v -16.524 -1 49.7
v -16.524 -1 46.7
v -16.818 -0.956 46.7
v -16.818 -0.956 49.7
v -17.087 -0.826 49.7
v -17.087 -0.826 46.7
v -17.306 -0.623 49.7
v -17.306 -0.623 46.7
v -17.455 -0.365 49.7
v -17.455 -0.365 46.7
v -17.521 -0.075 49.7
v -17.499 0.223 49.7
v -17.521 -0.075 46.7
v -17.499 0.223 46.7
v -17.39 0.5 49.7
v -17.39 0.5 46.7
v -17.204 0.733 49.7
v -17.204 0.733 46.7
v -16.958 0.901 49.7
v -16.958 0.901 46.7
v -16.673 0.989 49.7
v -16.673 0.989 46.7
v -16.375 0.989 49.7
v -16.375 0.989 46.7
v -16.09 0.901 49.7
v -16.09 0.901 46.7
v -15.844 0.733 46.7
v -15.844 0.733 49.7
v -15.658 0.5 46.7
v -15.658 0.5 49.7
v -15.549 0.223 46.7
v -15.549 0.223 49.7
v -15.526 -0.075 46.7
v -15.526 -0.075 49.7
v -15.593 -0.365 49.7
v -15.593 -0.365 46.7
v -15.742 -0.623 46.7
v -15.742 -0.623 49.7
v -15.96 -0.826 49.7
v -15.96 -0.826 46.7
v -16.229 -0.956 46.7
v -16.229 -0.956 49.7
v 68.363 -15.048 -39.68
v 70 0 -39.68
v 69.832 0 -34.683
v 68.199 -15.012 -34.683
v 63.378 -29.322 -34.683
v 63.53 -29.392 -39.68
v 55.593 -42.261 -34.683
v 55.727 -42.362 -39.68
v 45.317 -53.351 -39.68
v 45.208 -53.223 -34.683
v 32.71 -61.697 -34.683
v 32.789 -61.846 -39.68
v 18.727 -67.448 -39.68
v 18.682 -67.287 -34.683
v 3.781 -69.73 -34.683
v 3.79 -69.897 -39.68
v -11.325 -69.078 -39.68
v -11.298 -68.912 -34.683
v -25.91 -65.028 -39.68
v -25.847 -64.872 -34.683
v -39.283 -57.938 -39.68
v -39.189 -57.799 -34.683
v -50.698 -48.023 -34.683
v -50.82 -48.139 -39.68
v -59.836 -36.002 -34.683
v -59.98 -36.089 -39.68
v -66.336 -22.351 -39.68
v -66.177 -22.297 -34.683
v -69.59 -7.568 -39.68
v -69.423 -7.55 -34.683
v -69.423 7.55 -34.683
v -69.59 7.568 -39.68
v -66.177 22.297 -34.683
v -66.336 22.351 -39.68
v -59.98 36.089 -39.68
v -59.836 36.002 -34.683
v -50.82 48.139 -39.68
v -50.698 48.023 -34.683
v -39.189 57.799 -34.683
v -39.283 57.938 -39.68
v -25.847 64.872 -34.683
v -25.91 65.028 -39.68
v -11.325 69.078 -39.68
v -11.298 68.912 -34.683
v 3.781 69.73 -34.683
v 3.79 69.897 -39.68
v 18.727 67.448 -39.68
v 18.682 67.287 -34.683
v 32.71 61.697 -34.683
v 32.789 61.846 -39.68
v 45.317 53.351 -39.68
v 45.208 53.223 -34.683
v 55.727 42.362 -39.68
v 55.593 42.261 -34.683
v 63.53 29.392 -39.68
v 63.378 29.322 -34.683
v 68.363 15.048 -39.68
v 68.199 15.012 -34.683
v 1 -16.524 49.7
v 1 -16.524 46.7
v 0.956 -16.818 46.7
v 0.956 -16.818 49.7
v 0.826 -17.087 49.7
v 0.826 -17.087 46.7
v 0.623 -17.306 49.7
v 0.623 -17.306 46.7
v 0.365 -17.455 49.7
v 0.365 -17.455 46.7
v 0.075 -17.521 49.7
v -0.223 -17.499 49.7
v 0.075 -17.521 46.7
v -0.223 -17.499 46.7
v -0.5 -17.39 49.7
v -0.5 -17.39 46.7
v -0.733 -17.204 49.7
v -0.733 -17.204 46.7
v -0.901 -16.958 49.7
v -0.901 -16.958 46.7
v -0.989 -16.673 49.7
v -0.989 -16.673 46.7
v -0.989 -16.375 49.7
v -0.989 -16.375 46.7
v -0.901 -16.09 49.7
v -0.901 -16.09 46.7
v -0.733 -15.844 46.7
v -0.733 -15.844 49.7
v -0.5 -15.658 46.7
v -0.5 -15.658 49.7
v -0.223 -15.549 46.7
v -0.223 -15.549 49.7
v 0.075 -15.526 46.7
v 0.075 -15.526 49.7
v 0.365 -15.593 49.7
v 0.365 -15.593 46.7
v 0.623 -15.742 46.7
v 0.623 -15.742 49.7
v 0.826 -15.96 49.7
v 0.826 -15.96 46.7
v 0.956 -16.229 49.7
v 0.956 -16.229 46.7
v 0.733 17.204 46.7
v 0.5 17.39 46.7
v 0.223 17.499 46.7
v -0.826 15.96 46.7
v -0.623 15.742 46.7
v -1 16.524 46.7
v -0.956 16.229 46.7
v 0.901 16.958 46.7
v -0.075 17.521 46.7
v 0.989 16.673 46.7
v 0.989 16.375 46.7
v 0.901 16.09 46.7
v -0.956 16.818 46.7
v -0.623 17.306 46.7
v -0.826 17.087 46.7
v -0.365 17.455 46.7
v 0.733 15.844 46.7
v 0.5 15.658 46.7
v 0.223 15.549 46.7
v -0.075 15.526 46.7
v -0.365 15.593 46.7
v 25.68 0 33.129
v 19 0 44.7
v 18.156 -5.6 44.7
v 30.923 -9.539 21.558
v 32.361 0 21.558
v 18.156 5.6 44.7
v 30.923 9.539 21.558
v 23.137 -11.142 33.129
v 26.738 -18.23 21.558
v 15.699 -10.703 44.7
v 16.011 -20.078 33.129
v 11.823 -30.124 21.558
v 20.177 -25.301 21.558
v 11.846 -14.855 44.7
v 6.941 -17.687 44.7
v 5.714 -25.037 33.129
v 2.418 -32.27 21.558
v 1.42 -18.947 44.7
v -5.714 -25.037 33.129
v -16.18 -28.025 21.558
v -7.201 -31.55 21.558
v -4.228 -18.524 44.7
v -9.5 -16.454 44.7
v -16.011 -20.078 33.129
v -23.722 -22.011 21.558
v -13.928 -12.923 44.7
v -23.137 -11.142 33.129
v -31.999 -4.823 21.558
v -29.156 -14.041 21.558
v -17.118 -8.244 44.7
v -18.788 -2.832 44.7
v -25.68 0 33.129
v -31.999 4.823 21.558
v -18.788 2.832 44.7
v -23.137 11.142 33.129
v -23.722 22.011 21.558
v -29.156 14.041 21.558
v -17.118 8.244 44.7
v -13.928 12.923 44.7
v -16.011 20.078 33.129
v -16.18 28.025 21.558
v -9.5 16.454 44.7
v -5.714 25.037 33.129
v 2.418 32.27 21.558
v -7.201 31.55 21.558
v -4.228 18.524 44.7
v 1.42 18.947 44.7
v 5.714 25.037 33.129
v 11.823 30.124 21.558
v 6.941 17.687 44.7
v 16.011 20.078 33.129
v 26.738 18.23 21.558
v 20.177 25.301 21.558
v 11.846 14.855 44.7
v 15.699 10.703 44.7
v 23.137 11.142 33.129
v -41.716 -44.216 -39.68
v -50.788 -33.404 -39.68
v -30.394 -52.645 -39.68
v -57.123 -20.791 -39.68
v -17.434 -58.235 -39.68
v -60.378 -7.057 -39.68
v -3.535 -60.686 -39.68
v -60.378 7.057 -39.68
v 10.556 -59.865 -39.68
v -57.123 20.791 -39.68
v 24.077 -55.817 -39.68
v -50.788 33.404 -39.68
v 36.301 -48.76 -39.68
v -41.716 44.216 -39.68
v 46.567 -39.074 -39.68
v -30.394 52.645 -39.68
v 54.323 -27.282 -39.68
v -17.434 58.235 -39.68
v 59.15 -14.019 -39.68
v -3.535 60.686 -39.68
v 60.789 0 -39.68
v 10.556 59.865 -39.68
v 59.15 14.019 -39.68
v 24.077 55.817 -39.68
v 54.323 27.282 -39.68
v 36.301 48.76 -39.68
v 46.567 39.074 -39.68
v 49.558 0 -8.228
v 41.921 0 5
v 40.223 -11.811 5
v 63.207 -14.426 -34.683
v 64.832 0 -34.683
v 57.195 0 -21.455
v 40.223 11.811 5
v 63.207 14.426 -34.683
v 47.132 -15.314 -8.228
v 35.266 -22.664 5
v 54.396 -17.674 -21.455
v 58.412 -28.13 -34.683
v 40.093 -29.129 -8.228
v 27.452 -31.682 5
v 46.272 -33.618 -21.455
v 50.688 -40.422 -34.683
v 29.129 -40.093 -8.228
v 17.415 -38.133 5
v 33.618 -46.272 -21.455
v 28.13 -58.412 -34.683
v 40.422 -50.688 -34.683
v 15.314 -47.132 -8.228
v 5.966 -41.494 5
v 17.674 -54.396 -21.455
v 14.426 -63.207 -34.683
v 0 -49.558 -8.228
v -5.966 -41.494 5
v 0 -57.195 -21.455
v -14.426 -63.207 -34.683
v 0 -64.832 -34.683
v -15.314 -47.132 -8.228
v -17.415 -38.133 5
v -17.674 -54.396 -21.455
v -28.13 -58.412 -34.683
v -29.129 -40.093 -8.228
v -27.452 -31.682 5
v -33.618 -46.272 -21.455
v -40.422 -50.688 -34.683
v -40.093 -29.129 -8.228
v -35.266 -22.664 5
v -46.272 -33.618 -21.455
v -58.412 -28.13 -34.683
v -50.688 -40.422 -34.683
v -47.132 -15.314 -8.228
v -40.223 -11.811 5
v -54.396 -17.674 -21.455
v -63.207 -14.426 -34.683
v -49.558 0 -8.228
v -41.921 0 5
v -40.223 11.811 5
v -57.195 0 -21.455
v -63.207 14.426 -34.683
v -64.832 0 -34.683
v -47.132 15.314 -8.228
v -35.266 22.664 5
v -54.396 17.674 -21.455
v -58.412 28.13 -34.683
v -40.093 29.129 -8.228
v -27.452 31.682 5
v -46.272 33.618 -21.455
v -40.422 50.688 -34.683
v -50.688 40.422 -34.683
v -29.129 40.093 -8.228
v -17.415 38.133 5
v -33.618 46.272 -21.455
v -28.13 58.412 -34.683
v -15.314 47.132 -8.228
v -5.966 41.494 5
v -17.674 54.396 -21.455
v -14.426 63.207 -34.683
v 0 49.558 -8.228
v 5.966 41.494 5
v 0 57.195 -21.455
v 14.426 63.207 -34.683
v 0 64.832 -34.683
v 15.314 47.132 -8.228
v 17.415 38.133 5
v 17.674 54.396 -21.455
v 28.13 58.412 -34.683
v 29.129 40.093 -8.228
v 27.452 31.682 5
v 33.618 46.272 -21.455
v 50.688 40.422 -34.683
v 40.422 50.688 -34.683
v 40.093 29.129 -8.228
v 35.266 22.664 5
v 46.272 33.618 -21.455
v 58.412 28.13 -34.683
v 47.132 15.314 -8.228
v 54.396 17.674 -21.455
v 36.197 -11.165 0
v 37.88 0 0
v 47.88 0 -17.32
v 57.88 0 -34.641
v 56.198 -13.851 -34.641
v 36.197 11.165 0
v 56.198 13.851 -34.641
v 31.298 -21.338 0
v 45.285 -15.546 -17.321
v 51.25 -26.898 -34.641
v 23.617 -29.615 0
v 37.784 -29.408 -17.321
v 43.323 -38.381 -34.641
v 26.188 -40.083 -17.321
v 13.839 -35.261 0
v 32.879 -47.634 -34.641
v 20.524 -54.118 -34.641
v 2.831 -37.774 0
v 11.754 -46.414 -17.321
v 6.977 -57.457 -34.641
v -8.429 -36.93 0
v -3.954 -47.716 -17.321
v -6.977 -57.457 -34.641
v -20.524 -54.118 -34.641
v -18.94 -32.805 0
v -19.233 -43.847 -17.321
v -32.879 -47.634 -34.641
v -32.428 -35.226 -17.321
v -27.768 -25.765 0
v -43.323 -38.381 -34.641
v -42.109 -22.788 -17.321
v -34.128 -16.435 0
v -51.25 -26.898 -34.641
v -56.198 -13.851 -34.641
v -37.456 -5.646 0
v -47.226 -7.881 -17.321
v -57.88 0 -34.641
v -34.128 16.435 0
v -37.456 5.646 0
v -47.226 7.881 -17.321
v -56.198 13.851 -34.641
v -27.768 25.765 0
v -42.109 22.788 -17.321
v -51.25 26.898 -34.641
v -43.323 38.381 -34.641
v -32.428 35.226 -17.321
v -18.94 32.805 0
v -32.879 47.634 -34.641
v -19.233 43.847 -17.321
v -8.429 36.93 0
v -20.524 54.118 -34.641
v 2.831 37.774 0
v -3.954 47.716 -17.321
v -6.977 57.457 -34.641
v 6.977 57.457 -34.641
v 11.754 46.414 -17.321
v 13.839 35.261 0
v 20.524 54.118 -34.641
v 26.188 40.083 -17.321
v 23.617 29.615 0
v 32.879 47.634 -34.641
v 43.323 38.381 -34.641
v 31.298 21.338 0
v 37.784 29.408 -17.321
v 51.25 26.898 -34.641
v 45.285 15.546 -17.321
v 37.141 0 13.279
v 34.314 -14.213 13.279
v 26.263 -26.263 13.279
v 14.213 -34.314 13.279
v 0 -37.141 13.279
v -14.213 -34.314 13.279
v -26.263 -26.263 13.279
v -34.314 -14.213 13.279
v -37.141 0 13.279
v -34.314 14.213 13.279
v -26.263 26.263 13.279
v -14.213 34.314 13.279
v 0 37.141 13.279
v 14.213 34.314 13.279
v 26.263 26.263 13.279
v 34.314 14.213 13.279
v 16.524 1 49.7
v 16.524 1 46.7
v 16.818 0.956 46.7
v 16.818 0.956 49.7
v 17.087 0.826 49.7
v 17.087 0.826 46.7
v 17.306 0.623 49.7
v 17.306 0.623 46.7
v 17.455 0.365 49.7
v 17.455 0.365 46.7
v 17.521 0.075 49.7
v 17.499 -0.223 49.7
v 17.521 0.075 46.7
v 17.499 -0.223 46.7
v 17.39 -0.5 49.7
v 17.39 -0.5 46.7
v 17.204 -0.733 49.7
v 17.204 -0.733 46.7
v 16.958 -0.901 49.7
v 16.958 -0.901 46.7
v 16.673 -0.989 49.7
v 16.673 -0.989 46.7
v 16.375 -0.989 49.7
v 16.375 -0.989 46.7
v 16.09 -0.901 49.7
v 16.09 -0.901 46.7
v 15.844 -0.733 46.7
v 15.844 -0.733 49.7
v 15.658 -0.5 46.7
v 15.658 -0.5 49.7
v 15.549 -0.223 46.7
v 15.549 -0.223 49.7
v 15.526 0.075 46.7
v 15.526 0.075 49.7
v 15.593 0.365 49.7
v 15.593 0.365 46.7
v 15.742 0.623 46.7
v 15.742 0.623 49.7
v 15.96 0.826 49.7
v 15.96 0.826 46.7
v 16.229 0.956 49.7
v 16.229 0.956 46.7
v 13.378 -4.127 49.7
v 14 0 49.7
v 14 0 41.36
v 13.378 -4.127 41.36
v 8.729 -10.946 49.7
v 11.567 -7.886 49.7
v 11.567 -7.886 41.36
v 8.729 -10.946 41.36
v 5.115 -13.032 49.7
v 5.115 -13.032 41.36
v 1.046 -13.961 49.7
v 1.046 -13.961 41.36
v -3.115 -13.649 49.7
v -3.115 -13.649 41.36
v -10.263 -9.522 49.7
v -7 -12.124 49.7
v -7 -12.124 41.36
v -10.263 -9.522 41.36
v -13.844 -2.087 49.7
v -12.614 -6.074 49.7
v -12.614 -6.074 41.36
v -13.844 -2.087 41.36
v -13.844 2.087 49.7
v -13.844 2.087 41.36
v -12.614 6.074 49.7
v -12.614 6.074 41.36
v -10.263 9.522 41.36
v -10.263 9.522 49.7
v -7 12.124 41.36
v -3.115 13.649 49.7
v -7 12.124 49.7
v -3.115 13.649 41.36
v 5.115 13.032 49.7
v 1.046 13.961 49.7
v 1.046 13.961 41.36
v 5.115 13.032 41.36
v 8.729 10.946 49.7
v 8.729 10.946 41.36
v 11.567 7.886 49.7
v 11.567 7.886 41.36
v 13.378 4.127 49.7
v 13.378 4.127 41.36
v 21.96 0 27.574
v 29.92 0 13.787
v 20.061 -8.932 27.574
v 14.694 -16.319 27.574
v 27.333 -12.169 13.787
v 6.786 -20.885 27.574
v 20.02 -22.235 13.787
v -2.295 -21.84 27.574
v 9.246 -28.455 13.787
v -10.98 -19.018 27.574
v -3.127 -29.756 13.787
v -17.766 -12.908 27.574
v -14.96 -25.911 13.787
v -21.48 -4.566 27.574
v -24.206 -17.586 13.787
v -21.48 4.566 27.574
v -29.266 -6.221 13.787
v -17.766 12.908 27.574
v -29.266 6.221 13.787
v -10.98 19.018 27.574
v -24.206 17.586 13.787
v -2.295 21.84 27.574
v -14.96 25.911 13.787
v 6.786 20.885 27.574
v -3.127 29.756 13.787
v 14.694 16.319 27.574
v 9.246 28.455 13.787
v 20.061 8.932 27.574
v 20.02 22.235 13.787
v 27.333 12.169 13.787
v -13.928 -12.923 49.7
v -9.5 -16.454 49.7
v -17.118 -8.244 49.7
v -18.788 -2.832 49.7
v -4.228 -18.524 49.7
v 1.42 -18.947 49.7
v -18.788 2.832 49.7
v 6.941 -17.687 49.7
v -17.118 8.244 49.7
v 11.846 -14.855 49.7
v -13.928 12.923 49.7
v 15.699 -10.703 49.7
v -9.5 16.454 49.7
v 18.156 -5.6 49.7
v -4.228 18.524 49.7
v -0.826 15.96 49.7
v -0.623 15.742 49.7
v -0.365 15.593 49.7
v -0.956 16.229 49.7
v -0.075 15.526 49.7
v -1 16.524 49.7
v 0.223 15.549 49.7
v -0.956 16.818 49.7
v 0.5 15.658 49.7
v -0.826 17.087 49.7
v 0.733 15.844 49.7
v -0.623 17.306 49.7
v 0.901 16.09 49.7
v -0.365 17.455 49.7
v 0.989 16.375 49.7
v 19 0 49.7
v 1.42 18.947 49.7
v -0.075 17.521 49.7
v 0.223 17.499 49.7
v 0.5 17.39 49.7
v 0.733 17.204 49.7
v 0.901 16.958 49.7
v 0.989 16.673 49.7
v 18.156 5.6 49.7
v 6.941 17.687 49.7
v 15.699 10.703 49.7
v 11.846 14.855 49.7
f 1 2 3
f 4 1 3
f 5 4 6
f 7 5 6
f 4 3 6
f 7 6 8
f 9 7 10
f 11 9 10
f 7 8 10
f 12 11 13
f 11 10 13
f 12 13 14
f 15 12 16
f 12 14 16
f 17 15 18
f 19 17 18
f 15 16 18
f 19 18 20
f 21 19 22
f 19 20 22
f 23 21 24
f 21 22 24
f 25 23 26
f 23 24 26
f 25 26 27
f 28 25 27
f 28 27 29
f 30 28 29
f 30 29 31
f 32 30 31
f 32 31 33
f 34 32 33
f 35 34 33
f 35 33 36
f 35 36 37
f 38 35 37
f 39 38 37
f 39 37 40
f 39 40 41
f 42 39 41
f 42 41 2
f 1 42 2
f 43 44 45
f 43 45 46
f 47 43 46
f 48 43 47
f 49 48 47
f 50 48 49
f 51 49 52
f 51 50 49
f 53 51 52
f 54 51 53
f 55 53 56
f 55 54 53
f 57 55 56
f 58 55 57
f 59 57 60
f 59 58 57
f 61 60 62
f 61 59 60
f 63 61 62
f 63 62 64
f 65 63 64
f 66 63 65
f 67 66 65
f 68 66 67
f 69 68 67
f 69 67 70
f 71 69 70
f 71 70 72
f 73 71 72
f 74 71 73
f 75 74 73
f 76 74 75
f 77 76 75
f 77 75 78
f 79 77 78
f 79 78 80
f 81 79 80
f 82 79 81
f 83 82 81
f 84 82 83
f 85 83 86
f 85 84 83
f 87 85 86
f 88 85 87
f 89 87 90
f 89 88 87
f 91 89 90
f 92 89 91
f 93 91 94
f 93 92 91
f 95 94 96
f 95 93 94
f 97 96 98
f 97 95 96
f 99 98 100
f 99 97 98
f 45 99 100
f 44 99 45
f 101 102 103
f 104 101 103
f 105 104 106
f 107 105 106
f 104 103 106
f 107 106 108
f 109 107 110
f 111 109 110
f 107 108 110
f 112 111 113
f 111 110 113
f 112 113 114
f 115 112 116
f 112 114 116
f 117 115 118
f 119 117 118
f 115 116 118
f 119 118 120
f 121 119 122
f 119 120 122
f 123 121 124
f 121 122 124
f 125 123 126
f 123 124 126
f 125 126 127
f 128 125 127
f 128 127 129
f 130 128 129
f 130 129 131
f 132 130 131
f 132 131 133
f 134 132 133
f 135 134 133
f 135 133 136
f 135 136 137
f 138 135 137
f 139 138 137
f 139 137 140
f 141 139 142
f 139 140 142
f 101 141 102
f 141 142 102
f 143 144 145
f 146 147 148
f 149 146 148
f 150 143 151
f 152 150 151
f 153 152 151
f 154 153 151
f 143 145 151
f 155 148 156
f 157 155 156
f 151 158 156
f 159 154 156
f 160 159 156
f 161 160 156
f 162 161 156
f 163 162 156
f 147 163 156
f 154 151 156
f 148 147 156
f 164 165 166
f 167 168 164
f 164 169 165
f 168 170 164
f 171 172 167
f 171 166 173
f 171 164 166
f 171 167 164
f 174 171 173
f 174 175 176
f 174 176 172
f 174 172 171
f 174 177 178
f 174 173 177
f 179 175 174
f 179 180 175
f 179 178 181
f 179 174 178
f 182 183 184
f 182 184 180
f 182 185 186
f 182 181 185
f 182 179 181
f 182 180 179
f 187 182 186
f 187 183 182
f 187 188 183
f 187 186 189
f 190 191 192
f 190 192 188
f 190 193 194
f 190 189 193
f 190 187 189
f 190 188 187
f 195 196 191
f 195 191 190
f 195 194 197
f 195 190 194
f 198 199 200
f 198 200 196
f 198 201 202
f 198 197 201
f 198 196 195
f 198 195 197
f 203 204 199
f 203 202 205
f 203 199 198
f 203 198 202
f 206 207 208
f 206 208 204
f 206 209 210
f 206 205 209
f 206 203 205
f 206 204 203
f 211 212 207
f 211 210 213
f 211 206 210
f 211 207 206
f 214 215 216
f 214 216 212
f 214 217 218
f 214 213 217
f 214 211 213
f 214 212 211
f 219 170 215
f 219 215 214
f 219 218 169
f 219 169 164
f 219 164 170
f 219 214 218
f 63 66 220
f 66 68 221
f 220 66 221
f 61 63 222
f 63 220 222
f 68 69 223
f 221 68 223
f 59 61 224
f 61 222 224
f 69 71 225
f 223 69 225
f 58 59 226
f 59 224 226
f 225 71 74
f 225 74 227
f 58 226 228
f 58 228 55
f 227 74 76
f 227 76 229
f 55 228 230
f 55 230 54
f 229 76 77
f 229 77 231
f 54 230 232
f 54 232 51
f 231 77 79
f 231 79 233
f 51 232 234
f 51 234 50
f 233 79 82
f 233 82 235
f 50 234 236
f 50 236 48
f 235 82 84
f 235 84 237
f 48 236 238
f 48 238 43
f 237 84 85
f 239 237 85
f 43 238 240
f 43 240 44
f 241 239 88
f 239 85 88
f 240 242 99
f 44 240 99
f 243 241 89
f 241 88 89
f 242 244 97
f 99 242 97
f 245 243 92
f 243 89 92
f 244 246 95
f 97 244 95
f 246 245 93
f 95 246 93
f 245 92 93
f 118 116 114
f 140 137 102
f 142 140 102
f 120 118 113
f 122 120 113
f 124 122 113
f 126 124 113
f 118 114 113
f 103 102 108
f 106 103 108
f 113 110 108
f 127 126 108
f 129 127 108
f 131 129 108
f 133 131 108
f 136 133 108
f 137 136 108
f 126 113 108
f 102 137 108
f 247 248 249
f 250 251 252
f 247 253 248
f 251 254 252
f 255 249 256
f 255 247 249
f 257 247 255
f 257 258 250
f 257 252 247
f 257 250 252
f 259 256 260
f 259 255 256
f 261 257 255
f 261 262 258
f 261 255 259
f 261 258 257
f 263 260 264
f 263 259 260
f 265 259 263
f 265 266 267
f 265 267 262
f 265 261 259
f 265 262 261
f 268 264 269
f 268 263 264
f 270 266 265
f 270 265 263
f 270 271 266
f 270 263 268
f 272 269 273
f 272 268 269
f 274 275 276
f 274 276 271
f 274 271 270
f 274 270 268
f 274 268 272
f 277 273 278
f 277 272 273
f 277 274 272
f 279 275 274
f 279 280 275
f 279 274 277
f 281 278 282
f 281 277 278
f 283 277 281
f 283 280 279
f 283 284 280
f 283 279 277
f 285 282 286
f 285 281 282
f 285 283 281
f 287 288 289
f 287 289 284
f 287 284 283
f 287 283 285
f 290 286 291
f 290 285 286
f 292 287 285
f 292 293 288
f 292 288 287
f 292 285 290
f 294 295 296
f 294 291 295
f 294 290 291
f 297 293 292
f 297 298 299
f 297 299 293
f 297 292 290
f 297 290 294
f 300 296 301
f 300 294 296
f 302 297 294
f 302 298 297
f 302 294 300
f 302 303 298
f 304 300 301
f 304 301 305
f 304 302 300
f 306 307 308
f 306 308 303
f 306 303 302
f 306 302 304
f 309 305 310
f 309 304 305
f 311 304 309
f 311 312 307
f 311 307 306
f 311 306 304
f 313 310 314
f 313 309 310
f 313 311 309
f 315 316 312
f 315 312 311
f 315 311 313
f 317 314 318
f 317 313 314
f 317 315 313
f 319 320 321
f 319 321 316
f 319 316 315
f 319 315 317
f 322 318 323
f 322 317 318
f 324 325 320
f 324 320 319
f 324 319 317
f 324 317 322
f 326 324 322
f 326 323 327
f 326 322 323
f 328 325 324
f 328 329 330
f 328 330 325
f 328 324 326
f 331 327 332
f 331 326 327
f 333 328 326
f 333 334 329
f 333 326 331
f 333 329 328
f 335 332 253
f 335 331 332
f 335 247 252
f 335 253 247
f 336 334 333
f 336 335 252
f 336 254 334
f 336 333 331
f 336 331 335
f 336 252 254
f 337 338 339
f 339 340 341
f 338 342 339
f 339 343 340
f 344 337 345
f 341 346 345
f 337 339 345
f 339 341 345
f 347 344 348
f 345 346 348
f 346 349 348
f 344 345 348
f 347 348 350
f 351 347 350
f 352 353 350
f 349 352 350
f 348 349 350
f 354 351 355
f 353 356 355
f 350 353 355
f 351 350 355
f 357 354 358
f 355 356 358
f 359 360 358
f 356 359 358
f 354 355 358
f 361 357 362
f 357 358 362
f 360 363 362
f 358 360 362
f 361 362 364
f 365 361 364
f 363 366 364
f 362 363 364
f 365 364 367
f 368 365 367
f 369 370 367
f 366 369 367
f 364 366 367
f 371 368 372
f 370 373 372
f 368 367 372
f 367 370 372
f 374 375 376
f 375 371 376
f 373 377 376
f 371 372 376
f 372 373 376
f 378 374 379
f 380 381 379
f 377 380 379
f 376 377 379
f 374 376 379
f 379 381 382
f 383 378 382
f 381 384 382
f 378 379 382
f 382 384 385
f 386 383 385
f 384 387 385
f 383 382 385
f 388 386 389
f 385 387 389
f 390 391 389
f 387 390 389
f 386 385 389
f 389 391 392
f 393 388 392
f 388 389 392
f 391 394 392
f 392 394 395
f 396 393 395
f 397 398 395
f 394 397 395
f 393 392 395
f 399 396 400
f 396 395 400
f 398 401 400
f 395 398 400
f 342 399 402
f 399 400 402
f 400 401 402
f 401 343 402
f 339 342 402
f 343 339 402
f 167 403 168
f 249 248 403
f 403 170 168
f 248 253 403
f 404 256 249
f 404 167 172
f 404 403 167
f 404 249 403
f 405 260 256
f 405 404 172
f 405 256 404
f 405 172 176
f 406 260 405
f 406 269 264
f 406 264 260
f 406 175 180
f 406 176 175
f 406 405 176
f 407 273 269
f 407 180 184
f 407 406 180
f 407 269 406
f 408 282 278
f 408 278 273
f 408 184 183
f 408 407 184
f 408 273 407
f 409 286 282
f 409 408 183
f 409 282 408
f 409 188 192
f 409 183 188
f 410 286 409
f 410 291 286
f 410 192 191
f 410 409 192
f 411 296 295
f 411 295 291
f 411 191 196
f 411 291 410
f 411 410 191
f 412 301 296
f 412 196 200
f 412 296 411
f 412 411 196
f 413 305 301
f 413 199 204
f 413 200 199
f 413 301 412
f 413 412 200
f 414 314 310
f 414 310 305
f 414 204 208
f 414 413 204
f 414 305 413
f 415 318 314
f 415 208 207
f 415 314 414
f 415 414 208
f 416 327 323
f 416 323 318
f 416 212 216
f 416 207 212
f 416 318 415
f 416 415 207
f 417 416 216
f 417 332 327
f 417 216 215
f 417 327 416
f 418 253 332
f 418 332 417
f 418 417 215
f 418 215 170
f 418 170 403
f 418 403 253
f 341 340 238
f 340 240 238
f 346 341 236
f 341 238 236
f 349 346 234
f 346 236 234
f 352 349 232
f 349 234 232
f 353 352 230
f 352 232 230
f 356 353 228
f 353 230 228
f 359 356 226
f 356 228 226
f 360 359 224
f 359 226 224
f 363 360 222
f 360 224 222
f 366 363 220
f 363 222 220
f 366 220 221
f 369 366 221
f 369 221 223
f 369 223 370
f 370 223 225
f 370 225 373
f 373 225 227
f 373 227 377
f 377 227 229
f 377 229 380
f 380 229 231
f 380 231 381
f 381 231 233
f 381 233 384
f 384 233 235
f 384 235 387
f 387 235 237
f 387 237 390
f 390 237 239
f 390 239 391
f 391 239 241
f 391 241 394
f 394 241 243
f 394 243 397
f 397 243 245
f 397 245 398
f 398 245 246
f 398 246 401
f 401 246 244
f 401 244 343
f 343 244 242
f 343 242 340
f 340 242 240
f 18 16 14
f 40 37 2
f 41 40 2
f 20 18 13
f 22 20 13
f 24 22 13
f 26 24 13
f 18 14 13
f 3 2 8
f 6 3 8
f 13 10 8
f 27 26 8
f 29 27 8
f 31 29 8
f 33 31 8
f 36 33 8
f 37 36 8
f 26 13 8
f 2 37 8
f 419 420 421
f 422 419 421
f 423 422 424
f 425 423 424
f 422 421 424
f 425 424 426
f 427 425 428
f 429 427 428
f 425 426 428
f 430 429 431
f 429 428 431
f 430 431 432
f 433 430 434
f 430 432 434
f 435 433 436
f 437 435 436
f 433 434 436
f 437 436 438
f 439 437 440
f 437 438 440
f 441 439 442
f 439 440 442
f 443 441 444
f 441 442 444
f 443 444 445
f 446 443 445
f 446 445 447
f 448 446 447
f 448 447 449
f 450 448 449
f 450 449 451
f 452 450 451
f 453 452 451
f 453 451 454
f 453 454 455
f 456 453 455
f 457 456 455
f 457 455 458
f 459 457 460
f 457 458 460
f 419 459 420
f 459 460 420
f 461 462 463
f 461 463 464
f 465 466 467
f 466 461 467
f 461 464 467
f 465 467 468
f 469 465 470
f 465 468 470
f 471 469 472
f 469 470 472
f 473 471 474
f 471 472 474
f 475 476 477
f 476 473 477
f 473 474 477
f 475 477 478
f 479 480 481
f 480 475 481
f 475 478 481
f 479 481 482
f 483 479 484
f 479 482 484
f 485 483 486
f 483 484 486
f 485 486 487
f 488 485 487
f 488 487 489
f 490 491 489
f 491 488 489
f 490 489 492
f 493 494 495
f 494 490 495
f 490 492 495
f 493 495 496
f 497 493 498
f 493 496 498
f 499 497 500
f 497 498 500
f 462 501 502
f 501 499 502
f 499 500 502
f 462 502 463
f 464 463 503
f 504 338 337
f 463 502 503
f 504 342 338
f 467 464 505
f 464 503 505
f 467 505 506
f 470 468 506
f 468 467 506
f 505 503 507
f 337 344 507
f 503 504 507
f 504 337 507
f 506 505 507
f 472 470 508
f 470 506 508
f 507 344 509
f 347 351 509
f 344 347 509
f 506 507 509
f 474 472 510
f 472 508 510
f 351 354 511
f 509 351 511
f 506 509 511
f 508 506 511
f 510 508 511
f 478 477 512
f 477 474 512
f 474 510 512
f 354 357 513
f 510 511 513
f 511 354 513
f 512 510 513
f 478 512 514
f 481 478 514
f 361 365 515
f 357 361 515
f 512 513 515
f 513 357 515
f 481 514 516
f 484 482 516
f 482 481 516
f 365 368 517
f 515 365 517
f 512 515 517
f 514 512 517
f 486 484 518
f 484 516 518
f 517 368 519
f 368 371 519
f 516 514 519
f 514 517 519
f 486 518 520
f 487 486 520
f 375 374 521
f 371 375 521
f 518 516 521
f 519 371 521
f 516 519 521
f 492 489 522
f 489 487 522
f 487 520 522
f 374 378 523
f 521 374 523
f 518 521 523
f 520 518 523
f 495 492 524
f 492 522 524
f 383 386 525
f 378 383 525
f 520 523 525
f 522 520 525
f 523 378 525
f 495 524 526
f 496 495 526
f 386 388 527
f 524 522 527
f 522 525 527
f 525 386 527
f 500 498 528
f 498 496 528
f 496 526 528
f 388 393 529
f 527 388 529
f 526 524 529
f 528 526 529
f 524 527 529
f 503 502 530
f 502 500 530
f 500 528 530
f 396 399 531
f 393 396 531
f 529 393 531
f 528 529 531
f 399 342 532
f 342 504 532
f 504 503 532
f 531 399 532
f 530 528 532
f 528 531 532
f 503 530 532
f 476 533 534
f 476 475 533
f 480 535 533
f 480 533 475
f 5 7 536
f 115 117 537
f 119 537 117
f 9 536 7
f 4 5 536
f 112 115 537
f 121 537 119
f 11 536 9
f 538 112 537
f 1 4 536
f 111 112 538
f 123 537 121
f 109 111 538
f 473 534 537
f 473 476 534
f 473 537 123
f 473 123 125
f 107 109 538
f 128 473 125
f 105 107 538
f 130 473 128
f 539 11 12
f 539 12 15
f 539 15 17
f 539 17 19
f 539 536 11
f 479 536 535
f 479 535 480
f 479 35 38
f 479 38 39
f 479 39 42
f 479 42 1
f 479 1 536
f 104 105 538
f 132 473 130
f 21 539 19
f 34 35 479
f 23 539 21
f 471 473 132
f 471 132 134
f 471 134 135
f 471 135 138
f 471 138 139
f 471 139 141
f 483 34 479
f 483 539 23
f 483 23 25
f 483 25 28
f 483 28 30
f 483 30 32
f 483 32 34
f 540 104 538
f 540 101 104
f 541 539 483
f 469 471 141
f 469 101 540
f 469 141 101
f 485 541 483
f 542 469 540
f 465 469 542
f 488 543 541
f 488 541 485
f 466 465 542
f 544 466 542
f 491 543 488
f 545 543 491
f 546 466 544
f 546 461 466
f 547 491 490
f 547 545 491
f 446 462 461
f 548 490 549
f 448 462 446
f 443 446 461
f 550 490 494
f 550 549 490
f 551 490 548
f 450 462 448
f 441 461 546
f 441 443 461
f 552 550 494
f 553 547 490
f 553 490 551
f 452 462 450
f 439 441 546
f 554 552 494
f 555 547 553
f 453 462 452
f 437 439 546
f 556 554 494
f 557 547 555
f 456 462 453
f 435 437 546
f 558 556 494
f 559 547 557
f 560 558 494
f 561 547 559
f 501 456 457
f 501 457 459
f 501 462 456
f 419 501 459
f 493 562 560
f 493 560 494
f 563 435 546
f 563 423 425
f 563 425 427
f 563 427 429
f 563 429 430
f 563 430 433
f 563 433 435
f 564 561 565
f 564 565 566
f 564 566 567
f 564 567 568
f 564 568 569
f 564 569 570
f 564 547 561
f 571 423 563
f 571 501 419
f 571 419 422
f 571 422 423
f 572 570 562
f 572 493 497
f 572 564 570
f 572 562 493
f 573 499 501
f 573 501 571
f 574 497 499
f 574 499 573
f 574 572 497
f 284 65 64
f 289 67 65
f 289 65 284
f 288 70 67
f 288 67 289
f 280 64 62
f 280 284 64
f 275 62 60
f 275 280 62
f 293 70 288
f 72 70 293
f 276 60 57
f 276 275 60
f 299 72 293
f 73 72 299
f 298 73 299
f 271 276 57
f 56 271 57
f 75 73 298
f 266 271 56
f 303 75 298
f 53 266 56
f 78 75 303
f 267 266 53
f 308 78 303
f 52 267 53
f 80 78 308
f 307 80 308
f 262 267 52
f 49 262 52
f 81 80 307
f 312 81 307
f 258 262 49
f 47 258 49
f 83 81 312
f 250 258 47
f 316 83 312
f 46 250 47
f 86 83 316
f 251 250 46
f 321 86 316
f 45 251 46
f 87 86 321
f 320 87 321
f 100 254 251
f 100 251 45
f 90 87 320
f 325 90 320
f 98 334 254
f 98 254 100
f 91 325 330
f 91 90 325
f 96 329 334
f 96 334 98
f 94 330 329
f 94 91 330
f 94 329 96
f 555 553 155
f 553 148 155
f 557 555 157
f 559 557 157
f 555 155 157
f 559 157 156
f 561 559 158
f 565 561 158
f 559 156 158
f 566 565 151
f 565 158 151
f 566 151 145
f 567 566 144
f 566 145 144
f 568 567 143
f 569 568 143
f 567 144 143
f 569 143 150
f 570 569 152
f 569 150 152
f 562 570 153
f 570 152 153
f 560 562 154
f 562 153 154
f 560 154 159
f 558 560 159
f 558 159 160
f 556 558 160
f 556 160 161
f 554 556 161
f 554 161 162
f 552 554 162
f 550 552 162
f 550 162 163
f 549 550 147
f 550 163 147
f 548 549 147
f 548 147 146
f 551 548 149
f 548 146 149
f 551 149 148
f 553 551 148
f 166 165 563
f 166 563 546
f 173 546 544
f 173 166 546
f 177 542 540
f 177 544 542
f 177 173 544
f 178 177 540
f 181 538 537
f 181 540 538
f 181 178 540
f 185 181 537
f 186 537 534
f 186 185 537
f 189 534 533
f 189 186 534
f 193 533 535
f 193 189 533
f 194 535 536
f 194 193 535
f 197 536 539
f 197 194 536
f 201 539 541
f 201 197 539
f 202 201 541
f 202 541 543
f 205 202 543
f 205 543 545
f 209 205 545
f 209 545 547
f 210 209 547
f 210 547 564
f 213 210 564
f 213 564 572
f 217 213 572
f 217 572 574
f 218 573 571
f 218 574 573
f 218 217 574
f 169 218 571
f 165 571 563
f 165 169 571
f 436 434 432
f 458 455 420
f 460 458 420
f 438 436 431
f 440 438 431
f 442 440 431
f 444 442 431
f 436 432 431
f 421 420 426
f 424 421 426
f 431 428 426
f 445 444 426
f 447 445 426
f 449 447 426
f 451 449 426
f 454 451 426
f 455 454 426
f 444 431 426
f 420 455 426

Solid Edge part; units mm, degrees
sketch "Sketch1" plane through (0, 0, 0) normal (0, -1, 0) x (1, 0, 0)
  line L0 (19, 44.7003) -> (32.3609, 21.5585)
  line L1 (32.3609, 21.5585) -> (41.921, 5)
  line L2 (41.921, 5) -> (64.832, -34.6831)
  line L3 (64.832, -34.6831) -> (69.832, -34.6831)
  line L4 (69.832, -34.6831) -> (70, -39.6803)
  line L5 (60.7889, -39.6803) -> (70, -39.6803)
  line L6 (57.8795, -34.641) -> (60.7889, -39.6803)
  line L7 (37.8795, 0) -> (57.8795, -34.641)
  line L8 (14, 41.3605) -> (37.8795, 0)
  line L9 (14, 49.7003) -> (14, 41.3605)
  line L10 (14, 49.7003) -> (19, 49.7003)
  line L11 (19, 49.7003) -> (19, 44.7003)
revolve "RevolvedProtrusion1" add sketch "Sketch1" angle 360 about axis through (0, 0, 0) along (0, 0, 1)
hole "Agujero_1" at (-16.5237, 0, 49.7003) direction (0, 0, -1) diameter 2 depth 3 thread major 2 thread length 2
pattern_circular "Pattern1" count 4 over 360 about axis through (0, 0, 49.7003) along (0, 0, -1) of "Agujero_1"
